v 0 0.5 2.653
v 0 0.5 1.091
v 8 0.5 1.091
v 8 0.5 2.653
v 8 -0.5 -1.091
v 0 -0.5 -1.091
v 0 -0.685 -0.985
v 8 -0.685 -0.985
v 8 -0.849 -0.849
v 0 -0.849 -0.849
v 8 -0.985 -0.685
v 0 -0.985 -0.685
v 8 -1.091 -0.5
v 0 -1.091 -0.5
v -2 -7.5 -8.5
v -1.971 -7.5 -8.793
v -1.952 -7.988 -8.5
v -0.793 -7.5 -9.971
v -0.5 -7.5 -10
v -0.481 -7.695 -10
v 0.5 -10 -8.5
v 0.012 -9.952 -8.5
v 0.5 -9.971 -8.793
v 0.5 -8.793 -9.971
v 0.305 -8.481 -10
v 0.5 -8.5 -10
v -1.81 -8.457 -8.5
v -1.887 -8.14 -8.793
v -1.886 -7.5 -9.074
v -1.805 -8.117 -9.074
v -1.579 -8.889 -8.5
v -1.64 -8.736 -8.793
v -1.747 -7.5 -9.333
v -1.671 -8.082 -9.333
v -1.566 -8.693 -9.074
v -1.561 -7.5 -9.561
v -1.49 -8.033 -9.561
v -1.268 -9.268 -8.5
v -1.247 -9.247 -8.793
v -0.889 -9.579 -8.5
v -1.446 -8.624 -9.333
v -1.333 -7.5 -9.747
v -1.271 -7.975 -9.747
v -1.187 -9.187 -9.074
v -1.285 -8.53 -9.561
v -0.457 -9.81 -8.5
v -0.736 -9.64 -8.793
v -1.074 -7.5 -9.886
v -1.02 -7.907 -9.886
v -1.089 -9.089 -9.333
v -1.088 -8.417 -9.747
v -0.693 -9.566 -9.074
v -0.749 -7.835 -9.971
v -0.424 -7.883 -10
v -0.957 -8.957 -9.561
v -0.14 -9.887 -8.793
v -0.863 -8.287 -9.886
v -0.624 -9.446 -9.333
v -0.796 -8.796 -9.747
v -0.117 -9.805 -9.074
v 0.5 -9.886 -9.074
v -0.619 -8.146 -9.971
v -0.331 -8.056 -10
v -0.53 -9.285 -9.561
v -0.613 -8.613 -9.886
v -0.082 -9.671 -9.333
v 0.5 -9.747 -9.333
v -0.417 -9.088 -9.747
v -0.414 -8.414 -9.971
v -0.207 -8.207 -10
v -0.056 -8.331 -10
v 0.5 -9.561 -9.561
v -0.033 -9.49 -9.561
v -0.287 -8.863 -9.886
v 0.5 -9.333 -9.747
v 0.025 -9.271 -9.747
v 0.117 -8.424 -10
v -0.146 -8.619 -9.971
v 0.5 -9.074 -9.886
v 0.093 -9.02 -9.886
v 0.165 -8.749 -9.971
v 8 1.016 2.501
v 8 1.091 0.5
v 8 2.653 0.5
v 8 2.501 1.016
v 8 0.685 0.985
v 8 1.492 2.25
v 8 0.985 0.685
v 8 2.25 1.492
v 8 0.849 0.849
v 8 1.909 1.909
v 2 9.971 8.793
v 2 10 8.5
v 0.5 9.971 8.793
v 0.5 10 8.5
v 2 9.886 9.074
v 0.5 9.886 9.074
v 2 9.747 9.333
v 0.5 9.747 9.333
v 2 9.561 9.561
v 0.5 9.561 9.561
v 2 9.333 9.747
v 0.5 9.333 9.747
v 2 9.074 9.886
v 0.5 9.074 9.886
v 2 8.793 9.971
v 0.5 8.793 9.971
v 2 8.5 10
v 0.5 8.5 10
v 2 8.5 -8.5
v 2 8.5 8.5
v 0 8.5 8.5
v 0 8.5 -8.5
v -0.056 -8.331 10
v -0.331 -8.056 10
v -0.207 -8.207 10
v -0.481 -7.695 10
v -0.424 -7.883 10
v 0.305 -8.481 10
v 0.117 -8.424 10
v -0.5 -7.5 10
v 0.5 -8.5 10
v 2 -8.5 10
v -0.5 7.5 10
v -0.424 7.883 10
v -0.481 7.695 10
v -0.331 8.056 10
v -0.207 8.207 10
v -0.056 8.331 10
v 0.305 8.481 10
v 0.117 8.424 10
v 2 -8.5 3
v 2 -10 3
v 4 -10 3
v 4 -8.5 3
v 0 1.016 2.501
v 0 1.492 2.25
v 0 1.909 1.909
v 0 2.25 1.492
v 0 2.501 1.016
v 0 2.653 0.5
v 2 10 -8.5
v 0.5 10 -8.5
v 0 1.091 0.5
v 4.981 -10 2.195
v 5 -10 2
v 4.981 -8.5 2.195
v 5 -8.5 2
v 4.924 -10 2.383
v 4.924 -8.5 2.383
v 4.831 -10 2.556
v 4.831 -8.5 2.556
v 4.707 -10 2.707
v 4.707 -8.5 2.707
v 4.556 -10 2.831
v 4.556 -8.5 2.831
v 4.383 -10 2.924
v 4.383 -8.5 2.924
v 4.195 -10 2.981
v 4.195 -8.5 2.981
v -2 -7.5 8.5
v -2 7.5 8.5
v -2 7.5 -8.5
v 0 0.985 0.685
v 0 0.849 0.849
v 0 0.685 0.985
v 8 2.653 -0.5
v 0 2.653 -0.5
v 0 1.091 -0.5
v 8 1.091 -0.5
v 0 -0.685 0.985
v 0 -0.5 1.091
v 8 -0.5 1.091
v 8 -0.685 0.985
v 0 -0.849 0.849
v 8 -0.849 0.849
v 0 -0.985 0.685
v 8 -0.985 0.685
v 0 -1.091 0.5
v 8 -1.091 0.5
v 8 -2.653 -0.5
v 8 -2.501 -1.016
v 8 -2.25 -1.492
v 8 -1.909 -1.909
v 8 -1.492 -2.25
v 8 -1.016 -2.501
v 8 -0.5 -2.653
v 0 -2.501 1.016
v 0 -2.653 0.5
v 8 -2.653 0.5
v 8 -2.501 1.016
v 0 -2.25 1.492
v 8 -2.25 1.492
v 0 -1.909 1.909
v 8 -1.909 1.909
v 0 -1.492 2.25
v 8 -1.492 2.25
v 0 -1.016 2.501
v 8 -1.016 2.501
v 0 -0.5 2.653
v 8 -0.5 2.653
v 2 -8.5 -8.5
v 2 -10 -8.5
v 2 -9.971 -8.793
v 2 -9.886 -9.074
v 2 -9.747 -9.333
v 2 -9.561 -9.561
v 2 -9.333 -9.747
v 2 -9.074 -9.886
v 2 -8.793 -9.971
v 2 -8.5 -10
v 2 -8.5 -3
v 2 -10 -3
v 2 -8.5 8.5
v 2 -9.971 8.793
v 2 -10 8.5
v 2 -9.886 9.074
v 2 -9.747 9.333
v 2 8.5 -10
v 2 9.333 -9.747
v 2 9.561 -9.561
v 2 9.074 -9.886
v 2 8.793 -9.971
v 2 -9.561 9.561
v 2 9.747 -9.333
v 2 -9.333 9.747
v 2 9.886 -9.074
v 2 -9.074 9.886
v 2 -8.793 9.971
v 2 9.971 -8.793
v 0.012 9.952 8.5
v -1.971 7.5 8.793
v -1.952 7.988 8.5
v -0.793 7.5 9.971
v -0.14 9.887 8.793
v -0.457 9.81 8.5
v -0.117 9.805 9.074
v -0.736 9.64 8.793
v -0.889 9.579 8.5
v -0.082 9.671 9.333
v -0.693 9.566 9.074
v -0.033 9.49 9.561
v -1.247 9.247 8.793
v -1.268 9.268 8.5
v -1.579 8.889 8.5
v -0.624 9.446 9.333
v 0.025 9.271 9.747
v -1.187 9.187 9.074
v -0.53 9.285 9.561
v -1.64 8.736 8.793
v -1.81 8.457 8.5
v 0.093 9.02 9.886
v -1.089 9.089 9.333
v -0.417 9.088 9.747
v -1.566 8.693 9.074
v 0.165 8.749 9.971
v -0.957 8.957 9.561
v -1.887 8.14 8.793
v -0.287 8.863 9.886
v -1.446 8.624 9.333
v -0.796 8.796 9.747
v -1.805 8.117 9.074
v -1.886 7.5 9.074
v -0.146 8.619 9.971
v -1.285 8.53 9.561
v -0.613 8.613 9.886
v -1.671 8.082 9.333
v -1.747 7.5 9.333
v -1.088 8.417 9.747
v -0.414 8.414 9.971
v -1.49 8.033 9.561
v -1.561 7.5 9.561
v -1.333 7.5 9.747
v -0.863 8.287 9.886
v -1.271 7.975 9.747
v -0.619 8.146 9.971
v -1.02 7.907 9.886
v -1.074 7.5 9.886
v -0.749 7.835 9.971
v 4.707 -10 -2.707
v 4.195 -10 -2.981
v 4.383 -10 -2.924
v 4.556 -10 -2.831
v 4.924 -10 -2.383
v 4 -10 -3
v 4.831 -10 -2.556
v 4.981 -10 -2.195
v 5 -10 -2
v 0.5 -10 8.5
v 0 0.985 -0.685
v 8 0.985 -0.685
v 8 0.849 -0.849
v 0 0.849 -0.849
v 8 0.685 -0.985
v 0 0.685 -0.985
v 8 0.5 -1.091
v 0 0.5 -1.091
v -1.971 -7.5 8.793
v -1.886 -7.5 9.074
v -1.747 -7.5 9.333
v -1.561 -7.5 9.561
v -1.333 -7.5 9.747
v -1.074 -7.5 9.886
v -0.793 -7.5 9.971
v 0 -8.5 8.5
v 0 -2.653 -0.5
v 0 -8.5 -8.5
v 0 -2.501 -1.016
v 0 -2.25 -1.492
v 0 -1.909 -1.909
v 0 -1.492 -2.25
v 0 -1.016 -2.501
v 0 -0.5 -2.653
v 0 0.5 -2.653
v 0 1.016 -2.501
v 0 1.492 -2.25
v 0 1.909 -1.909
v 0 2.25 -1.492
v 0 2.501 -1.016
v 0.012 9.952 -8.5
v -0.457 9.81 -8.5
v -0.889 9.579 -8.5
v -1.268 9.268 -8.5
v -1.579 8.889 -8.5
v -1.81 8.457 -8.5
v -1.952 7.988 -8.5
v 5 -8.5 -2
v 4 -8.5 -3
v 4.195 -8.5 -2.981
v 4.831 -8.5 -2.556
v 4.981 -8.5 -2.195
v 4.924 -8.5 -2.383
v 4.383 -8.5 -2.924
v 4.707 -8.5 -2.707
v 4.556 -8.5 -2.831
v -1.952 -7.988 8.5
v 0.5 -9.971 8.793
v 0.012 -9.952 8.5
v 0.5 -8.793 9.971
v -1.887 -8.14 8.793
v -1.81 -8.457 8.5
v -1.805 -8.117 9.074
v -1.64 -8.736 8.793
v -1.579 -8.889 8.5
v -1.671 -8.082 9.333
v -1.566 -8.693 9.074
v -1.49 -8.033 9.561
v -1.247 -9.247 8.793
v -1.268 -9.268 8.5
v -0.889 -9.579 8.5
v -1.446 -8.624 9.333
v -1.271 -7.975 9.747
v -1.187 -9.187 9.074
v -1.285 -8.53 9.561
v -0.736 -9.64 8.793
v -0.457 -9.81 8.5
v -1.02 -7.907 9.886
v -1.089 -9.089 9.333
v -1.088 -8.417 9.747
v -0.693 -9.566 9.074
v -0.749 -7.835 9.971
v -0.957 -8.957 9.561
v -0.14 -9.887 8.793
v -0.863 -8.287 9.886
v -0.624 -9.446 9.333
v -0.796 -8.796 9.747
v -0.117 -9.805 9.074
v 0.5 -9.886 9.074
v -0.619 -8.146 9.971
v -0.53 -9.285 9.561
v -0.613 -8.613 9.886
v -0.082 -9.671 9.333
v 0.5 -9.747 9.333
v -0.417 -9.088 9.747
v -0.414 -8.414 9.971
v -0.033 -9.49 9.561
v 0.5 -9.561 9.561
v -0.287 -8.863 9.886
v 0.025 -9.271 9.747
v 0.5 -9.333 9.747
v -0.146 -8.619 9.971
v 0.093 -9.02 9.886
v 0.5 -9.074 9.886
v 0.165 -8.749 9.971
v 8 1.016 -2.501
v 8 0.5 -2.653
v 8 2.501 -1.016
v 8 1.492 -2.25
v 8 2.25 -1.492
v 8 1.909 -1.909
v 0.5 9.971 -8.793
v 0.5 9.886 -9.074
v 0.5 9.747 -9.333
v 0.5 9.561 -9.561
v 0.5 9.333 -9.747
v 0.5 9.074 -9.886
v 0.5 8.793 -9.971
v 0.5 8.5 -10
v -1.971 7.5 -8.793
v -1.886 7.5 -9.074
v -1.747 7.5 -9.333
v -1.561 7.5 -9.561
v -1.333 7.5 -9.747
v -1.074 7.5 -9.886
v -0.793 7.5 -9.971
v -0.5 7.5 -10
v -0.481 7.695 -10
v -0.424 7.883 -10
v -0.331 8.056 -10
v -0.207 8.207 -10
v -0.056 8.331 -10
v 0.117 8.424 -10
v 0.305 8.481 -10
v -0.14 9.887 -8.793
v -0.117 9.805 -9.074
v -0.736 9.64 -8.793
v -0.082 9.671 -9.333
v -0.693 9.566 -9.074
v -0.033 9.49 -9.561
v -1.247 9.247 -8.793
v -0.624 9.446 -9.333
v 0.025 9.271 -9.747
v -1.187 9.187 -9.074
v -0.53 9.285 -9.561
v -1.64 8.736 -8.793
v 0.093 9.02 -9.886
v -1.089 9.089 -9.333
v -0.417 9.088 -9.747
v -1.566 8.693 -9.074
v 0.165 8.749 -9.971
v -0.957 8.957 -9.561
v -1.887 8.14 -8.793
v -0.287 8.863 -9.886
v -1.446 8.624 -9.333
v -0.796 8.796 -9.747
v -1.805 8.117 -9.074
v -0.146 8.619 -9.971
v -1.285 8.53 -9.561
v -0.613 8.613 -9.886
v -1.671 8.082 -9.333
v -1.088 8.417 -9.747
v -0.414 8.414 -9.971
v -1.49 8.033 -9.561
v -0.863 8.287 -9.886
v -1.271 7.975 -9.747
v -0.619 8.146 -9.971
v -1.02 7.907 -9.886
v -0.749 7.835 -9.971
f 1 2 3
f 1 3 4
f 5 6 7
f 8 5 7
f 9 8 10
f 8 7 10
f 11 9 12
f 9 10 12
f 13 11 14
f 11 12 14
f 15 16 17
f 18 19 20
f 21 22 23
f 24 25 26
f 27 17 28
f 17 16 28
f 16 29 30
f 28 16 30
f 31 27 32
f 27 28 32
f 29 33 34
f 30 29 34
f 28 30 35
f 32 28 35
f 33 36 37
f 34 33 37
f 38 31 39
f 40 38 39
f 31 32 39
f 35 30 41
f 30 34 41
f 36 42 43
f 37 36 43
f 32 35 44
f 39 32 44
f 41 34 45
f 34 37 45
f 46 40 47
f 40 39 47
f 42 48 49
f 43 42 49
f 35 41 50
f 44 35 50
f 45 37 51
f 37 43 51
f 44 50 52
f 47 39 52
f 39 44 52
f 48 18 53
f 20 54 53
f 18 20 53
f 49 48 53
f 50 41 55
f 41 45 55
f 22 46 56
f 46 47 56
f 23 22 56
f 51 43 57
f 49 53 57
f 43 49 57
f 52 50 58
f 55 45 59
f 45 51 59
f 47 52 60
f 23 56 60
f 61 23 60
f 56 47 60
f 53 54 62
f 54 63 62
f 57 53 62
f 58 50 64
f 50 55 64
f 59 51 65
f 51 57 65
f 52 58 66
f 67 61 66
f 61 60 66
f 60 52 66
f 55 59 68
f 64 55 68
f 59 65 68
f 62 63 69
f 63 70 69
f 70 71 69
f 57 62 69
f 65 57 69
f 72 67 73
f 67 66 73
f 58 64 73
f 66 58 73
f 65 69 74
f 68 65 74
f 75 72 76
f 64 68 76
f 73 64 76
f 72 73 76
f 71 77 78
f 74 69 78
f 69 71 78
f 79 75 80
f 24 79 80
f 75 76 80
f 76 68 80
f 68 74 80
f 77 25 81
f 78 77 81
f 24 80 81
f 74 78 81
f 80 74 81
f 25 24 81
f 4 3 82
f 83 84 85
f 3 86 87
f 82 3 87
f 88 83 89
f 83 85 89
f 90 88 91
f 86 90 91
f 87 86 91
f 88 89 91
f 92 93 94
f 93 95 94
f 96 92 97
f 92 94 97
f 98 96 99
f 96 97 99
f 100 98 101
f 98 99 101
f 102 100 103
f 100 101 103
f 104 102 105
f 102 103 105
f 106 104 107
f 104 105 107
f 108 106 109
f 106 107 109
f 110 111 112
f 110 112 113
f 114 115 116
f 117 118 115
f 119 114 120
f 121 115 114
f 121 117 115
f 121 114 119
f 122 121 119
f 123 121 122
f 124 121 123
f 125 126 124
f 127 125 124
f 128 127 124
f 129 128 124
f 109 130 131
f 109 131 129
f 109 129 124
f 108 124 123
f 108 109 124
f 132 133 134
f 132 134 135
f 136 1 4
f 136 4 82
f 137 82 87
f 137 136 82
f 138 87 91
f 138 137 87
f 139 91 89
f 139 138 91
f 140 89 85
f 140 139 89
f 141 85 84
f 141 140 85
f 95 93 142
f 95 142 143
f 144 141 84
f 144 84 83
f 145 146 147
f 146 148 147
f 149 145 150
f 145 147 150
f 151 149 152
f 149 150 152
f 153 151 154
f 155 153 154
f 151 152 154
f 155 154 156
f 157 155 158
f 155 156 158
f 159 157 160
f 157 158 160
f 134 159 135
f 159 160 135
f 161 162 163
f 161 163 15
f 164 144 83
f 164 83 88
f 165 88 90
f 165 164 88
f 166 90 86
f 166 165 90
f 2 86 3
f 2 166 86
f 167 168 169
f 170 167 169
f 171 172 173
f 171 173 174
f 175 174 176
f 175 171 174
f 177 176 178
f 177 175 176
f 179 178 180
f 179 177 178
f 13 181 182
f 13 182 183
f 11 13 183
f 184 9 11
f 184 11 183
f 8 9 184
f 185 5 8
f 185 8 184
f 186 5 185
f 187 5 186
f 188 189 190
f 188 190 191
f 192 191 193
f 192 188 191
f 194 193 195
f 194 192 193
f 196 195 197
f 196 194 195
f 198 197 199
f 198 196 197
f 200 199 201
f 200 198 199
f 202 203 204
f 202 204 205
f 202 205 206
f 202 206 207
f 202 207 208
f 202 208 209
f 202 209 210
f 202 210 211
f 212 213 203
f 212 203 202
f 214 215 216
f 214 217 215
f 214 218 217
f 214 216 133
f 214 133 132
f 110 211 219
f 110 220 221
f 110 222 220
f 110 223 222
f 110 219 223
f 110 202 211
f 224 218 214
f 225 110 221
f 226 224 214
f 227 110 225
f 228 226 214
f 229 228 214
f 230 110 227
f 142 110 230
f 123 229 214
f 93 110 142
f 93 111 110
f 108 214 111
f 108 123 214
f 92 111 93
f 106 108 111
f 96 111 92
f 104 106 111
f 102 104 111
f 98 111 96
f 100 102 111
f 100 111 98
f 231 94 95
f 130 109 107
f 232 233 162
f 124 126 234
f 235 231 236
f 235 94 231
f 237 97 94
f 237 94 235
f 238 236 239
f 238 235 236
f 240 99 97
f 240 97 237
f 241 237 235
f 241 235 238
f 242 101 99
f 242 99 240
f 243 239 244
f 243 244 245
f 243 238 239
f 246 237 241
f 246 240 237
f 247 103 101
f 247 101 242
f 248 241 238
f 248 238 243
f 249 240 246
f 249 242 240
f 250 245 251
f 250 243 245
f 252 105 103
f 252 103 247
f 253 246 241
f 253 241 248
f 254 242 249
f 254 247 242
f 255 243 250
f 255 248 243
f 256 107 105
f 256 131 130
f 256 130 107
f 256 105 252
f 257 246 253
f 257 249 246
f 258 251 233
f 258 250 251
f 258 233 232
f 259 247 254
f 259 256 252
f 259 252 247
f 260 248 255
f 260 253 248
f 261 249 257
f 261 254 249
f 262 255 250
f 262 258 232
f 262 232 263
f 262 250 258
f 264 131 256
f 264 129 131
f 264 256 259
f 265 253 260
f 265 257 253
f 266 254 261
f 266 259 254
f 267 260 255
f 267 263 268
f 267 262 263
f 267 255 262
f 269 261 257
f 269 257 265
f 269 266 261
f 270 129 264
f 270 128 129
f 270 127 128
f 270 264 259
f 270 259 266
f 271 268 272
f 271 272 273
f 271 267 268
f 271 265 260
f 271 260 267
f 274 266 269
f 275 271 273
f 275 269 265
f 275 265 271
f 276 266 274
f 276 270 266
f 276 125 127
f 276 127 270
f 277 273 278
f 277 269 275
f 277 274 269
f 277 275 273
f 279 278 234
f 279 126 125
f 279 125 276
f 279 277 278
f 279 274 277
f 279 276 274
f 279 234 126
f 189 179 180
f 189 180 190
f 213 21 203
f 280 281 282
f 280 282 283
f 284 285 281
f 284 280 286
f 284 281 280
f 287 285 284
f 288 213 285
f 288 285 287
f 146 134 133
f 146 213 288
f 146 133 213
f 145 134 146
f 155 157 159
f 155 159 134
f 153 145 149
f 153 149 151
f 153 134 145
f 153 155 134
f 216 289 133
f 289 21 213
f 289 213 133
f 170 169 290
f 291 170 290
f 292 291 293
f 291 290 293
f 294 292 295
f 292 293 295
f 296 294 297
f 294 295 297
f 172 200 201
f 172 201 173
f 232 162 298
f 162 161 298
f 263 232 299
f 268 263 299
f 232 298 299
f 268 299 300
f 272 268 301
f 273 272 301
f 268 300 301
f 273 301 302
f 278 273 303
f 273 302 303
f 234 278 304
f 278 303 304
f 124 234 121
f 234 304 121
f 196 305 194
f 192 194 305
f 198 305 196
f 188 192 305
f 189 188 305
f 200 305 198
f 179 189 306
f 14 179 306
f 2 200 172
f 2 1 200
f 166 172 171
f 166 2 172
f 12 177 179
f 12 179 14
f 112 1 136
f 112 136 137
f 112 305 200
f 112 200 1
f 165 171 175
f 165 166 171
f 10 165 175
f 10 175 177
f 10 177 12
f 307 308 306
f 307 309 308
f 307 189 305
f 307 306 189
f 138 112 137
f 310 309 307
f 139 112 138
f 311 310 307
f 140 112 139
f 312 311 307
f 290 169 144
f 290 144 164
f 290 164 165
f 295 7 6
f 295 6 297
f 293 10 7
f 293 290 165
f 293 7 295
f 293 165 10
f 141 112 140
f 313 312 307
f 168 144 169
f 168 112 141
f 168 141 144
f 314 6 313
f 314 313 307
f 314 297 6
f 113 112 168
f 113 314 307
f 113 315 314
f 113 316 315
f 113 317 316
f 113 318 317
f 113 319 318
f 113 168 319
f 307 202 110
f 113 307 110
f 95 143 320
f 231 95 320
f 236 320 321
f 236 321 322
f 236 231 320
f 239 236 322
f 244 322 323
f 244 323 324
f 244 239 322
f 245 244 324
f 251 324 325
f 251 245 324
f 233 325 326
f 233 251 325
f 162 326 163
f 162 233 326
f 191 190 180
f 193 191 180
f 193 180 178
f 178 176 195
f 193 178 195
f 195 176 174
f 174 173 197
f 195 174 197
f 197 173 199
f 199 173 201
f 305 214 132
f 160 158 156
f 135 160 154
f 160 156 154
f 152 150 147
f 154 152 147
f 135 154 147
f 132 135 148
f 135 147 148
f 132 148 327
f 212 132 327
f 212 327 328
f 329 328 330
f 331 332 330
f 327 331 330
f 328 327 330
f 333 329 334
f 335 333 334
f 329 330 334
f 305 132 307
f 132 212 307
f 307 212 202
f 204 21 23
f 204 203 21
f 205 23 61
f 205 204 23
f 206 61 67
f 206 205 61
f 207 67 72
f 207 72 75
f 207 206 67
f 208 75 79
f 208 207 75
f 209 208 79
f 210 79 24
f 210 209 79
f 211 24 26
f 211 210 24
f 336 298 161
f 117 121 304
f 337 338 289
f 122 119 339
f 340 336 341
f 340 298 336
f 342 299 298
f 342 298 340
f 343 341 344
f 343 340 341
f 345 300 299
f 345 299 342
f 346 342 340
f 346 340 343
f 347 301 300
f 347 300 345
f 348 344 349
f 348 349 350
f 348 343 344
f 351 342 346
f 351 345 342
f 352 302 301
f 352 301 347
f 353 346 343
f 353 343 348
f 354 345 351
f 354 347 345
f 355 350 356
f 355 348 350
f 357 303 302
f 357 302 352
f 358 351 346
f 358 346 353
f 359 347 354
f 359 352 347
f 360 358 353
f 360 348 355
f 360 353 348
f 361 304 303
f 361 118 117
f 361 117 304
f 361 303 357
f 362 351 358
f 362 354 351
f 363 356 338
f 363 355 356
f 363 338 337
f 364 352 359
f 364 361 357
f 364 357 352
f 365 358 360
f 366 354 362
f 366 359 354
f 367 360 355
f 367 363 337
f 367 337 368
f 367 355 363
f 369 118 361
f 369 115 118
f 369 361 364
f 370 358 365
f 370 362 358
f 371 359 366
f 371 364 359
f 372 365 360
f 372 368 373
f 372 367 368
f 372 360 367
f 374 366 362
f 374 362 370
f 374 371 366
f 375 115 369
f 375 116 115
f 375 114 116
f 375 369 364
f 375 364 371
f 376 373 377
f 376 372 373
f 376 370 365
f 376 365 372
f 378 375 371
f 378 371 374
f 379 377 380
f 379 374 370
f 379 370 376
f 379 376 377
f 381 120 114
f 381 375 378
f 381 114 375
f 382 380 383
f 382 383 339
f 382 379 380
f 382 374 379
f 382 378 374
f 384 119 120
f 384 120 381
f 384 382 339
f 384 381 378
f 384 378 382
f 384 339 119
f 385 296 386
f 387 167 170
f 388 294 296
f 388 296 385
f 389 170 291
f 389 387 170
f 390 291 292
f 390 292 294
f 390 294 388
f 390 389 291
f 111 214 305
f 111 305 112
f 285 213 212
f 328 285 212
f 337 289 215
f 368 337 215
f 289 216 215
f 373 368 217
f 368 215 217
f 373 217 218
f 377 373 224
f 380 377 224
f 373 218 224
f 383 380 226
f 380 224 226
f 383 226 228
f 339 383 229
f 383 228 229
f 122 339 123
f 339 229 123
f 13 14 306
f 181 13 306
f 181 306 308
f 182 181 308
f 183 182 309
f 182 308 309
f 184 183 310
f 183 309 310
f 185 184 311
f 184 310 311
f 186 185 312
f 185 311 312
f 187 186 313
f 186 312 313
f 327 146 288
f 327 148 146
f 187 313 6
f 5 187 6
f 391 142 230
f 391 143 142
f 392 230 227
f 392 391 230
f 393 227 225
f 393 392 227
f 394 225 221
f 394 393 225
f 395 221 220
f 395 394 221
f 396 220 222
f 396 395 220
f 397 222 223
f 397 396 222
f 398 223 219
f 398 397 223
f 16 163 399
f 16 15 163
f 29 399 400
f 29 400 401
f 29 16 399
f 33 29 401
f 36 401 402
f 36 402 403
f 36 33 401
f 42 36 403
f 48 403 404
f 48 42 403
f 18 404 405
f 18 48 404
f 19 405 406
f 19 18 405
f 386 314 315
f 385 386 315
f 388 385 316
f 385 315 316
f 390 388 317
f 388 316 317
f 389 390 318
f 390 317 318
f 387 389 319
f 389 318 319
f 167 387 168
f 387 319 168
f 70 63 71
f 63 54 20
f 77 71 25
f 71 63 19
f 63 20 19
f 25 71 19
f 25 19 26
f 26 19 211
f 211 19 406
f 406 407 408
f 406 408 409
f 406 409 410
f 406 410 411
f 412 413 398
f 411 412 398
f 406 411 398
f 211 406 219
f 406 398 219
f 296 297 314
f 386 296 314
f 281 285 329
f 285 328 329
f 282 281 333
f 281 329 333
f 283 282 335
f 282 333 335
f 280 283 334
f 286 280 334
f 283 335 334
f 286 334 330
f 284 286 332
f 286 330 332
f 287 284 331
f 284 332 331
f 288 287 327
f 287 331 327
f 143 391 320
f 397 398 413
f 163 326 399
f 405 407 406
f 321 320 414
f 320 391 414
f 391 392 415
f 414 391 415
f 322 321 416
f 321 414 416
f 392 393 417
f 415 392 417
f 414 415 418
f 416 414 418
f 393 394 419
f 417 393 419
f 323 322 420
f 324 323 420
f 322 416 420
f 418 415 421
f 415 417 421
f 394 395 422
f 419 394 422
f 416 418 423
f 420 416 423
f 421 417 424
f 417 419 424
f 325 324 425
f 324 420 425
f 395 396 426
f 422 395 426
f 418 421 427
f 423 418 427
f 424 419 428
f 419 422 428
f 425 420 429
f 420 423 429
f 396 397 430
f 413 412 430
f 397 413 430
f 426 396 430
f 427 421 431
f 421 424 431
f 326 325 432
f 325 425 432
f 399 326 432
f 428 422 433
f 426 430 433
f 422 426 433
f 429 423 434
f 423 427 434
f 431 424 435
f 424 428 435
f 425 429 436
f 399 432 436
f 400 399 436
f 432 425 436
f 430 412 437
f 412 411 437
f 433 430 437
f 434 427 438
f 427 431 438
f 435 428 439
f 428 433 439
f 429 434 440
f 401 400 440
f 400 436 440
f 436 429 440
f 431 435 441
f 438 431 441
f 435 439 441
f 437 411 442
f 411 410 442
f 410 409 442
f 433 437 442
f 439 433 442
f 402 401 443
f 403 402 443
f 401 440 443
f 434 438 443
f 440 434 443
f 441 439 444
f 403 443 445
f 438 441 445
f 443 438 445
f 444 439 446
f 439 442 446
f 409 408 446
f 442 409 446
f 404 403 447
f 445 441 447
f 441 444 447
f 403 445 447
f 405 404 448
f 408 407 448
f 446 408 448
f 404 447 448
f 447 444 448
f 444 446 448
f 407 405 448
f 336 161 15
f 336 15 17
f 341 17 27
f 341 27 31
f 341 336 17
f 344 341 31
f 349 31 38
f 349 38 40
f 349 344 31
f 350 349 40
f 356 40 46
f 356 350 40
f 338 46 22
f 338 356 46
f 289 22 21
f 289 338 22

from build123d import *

# Parameters (mm, degrees)
EXTRUDE_3_DEPTH      = 10
EXTRUDE_3_DEPTH_BACK = 10
FILLET_3_R           = 1.5
SKETCH_6_W           = 17
SKETCH_6_H           = 17
CUT_EXTRUDE_2_DEPTH  = 2
SKETCH_9_W           = 6
SKETCH_9_H           = 1.5
EXTRUDE_6_DEPTH      = 3
EXTRUDE_7_DEPTH      = 8
FILLET_4_R           = 1


with BuildPart() as part:
    # Sketch 3 → Extrude 3 (new body, two sides)
    with BuildSketch(Plane.XY) as extrude_3_sk:
        with BuildLine():
            Line((0.5, -10), (2, -10))
            Line((2, -10), (2, 10))
            Line((2, 10), (0.5, 10))
            ThreePointArc((0.5, 10), (-1.267766953, 9.267766953), (-2, 7.5))
            Line((-2, 7.5), (-2, -7.5))
            ThreePointArc((-2, -7.5), (-1.267766953, -9.267766953), (0.5, -10))
        make_face()
    extrude(amount=EXTRUDE_3_DEPTH)
    extrude(extrude_3_sk.sketch, amount=-EXTRUDE_3_DEPTH_BACK)

    # Fillet 3
    fillet_3_edges = [part.edges().sort_by_distance(p)[0] for p in [
        (-1.267766953, 9.267766953, -10),
        (-2, 0, -10),
        (1.25, 10, 10),
        (-1.267766953, 9.267766953, 10),
        (-2, 0, 10),
        (-1.267766953, -9.267766953, 10),
        (1.25, -10, 10),
        (-1.267766953, -9.267766953, -10),
        (1.25, -10, -10),
        (1.25, 10, -10),
    ]]
    fillet(fillet_3_edges, radius=FILLET_3_R)

    # Sketch 6 → Cut-Extrude 2 (cut)
    with BuildSketch(Plane(origin=(2, 0, 0), x_dir=(0, 0, -1), z_dir=(1, 0, 0))):
        Rectangle(SKETCH_6_W, SKETCH_6_H)
    extrude(amount=-CUT_EXTRUDE_2_DEPTH, mode=Mode.SUBTRACT)

    # Sketch 9 → Extrude 6 (add)
    with BuildSketch(Plane(origin=(2, 0, 0), x_dir=(0, 0, -1), z_dir=(1, 0, 0))):
        with Locations((0, -9.25)):
            Rectangle(SKETCH_9_W, SKETCH_9_H)
    extrude(amount=EXTRUDE_6_DEPTH)

    # Sketch 10 → Extrude 7 (add)
    with BuildSketch(Plane(origin=(0, 0, 0), x_dir=(0, 0, -1), z_dir=(1, 0, 0))):
        with BuildLine():
            Line((-0.5, 2.653299832), (-0.5, 1.090871211))
            ThreePointArc((-0.5, 1.090871211), (-0.848528137, 0.848528137), (-1.090871211, 0.5))
            Line((-1.090871211, 0.5), (-2.653299832, 0.5))
            ThreePointArc((-2.653299832, 0.5), (-1.909188309, 1.909188309), (-0.5, 2.653299832))
        make_face()
        with BuildLine():
            Line((0.5, 2.653299832), (0.5, 1.090871211))
            ThreePointArc((0.5, 1.090871211), (0.848528137, 0.848528137), (1.090871211, 0.5))
            Line((1.090871211, 0.5), (2.653299832, 0.5))
            ThreePointArc((2.653299832, 0.5), (1.909188309, 1.909188309), (0.5, 2.653299832))
        make_face()
        with BuildLine():
            Line((-2.653299832, -0.5), (-1.090871211, -0.5))
            ThreePointArc((-1.090871211, -0.5), (-0.848528137, -0.848528137), (-0.5, -1.090871211))
            Line((-0.5, -1.090871211), (-0.5, -2.653299832))
            ThreePointArc((-0.5, -2.653299832), (-1.909188309, -1.909188309), (-2.653299832, -0.5))
        make_face()
        with BuildLine():
            Line((0.5, -1.090871211), (0.5, -2.653299832))
            ThreePointArc((0.5, -2.653299832), (1.909188309, -1.909188309), (2.653299832, -0.5))
            Line((2.653299832, -0.5), (1.090871211, -0.5))
            ThreePointArc((1.090871211, -0.5), (0.848528137, -0.848528137), (0.5, -1.090871211))
        make_face()
    extrude(amount=EXTRUDE_7_DEPTH)

    # Fillet 4
    fillet_4_edges = [part.edges().sort_by_distance(p)[0] for p in [
        (5, -9.25, 3),
        (5, -9.25, -3),
    ]]
    fillet(fillet_4_edges, radius=FILLET_4_R)


solid = part.part
